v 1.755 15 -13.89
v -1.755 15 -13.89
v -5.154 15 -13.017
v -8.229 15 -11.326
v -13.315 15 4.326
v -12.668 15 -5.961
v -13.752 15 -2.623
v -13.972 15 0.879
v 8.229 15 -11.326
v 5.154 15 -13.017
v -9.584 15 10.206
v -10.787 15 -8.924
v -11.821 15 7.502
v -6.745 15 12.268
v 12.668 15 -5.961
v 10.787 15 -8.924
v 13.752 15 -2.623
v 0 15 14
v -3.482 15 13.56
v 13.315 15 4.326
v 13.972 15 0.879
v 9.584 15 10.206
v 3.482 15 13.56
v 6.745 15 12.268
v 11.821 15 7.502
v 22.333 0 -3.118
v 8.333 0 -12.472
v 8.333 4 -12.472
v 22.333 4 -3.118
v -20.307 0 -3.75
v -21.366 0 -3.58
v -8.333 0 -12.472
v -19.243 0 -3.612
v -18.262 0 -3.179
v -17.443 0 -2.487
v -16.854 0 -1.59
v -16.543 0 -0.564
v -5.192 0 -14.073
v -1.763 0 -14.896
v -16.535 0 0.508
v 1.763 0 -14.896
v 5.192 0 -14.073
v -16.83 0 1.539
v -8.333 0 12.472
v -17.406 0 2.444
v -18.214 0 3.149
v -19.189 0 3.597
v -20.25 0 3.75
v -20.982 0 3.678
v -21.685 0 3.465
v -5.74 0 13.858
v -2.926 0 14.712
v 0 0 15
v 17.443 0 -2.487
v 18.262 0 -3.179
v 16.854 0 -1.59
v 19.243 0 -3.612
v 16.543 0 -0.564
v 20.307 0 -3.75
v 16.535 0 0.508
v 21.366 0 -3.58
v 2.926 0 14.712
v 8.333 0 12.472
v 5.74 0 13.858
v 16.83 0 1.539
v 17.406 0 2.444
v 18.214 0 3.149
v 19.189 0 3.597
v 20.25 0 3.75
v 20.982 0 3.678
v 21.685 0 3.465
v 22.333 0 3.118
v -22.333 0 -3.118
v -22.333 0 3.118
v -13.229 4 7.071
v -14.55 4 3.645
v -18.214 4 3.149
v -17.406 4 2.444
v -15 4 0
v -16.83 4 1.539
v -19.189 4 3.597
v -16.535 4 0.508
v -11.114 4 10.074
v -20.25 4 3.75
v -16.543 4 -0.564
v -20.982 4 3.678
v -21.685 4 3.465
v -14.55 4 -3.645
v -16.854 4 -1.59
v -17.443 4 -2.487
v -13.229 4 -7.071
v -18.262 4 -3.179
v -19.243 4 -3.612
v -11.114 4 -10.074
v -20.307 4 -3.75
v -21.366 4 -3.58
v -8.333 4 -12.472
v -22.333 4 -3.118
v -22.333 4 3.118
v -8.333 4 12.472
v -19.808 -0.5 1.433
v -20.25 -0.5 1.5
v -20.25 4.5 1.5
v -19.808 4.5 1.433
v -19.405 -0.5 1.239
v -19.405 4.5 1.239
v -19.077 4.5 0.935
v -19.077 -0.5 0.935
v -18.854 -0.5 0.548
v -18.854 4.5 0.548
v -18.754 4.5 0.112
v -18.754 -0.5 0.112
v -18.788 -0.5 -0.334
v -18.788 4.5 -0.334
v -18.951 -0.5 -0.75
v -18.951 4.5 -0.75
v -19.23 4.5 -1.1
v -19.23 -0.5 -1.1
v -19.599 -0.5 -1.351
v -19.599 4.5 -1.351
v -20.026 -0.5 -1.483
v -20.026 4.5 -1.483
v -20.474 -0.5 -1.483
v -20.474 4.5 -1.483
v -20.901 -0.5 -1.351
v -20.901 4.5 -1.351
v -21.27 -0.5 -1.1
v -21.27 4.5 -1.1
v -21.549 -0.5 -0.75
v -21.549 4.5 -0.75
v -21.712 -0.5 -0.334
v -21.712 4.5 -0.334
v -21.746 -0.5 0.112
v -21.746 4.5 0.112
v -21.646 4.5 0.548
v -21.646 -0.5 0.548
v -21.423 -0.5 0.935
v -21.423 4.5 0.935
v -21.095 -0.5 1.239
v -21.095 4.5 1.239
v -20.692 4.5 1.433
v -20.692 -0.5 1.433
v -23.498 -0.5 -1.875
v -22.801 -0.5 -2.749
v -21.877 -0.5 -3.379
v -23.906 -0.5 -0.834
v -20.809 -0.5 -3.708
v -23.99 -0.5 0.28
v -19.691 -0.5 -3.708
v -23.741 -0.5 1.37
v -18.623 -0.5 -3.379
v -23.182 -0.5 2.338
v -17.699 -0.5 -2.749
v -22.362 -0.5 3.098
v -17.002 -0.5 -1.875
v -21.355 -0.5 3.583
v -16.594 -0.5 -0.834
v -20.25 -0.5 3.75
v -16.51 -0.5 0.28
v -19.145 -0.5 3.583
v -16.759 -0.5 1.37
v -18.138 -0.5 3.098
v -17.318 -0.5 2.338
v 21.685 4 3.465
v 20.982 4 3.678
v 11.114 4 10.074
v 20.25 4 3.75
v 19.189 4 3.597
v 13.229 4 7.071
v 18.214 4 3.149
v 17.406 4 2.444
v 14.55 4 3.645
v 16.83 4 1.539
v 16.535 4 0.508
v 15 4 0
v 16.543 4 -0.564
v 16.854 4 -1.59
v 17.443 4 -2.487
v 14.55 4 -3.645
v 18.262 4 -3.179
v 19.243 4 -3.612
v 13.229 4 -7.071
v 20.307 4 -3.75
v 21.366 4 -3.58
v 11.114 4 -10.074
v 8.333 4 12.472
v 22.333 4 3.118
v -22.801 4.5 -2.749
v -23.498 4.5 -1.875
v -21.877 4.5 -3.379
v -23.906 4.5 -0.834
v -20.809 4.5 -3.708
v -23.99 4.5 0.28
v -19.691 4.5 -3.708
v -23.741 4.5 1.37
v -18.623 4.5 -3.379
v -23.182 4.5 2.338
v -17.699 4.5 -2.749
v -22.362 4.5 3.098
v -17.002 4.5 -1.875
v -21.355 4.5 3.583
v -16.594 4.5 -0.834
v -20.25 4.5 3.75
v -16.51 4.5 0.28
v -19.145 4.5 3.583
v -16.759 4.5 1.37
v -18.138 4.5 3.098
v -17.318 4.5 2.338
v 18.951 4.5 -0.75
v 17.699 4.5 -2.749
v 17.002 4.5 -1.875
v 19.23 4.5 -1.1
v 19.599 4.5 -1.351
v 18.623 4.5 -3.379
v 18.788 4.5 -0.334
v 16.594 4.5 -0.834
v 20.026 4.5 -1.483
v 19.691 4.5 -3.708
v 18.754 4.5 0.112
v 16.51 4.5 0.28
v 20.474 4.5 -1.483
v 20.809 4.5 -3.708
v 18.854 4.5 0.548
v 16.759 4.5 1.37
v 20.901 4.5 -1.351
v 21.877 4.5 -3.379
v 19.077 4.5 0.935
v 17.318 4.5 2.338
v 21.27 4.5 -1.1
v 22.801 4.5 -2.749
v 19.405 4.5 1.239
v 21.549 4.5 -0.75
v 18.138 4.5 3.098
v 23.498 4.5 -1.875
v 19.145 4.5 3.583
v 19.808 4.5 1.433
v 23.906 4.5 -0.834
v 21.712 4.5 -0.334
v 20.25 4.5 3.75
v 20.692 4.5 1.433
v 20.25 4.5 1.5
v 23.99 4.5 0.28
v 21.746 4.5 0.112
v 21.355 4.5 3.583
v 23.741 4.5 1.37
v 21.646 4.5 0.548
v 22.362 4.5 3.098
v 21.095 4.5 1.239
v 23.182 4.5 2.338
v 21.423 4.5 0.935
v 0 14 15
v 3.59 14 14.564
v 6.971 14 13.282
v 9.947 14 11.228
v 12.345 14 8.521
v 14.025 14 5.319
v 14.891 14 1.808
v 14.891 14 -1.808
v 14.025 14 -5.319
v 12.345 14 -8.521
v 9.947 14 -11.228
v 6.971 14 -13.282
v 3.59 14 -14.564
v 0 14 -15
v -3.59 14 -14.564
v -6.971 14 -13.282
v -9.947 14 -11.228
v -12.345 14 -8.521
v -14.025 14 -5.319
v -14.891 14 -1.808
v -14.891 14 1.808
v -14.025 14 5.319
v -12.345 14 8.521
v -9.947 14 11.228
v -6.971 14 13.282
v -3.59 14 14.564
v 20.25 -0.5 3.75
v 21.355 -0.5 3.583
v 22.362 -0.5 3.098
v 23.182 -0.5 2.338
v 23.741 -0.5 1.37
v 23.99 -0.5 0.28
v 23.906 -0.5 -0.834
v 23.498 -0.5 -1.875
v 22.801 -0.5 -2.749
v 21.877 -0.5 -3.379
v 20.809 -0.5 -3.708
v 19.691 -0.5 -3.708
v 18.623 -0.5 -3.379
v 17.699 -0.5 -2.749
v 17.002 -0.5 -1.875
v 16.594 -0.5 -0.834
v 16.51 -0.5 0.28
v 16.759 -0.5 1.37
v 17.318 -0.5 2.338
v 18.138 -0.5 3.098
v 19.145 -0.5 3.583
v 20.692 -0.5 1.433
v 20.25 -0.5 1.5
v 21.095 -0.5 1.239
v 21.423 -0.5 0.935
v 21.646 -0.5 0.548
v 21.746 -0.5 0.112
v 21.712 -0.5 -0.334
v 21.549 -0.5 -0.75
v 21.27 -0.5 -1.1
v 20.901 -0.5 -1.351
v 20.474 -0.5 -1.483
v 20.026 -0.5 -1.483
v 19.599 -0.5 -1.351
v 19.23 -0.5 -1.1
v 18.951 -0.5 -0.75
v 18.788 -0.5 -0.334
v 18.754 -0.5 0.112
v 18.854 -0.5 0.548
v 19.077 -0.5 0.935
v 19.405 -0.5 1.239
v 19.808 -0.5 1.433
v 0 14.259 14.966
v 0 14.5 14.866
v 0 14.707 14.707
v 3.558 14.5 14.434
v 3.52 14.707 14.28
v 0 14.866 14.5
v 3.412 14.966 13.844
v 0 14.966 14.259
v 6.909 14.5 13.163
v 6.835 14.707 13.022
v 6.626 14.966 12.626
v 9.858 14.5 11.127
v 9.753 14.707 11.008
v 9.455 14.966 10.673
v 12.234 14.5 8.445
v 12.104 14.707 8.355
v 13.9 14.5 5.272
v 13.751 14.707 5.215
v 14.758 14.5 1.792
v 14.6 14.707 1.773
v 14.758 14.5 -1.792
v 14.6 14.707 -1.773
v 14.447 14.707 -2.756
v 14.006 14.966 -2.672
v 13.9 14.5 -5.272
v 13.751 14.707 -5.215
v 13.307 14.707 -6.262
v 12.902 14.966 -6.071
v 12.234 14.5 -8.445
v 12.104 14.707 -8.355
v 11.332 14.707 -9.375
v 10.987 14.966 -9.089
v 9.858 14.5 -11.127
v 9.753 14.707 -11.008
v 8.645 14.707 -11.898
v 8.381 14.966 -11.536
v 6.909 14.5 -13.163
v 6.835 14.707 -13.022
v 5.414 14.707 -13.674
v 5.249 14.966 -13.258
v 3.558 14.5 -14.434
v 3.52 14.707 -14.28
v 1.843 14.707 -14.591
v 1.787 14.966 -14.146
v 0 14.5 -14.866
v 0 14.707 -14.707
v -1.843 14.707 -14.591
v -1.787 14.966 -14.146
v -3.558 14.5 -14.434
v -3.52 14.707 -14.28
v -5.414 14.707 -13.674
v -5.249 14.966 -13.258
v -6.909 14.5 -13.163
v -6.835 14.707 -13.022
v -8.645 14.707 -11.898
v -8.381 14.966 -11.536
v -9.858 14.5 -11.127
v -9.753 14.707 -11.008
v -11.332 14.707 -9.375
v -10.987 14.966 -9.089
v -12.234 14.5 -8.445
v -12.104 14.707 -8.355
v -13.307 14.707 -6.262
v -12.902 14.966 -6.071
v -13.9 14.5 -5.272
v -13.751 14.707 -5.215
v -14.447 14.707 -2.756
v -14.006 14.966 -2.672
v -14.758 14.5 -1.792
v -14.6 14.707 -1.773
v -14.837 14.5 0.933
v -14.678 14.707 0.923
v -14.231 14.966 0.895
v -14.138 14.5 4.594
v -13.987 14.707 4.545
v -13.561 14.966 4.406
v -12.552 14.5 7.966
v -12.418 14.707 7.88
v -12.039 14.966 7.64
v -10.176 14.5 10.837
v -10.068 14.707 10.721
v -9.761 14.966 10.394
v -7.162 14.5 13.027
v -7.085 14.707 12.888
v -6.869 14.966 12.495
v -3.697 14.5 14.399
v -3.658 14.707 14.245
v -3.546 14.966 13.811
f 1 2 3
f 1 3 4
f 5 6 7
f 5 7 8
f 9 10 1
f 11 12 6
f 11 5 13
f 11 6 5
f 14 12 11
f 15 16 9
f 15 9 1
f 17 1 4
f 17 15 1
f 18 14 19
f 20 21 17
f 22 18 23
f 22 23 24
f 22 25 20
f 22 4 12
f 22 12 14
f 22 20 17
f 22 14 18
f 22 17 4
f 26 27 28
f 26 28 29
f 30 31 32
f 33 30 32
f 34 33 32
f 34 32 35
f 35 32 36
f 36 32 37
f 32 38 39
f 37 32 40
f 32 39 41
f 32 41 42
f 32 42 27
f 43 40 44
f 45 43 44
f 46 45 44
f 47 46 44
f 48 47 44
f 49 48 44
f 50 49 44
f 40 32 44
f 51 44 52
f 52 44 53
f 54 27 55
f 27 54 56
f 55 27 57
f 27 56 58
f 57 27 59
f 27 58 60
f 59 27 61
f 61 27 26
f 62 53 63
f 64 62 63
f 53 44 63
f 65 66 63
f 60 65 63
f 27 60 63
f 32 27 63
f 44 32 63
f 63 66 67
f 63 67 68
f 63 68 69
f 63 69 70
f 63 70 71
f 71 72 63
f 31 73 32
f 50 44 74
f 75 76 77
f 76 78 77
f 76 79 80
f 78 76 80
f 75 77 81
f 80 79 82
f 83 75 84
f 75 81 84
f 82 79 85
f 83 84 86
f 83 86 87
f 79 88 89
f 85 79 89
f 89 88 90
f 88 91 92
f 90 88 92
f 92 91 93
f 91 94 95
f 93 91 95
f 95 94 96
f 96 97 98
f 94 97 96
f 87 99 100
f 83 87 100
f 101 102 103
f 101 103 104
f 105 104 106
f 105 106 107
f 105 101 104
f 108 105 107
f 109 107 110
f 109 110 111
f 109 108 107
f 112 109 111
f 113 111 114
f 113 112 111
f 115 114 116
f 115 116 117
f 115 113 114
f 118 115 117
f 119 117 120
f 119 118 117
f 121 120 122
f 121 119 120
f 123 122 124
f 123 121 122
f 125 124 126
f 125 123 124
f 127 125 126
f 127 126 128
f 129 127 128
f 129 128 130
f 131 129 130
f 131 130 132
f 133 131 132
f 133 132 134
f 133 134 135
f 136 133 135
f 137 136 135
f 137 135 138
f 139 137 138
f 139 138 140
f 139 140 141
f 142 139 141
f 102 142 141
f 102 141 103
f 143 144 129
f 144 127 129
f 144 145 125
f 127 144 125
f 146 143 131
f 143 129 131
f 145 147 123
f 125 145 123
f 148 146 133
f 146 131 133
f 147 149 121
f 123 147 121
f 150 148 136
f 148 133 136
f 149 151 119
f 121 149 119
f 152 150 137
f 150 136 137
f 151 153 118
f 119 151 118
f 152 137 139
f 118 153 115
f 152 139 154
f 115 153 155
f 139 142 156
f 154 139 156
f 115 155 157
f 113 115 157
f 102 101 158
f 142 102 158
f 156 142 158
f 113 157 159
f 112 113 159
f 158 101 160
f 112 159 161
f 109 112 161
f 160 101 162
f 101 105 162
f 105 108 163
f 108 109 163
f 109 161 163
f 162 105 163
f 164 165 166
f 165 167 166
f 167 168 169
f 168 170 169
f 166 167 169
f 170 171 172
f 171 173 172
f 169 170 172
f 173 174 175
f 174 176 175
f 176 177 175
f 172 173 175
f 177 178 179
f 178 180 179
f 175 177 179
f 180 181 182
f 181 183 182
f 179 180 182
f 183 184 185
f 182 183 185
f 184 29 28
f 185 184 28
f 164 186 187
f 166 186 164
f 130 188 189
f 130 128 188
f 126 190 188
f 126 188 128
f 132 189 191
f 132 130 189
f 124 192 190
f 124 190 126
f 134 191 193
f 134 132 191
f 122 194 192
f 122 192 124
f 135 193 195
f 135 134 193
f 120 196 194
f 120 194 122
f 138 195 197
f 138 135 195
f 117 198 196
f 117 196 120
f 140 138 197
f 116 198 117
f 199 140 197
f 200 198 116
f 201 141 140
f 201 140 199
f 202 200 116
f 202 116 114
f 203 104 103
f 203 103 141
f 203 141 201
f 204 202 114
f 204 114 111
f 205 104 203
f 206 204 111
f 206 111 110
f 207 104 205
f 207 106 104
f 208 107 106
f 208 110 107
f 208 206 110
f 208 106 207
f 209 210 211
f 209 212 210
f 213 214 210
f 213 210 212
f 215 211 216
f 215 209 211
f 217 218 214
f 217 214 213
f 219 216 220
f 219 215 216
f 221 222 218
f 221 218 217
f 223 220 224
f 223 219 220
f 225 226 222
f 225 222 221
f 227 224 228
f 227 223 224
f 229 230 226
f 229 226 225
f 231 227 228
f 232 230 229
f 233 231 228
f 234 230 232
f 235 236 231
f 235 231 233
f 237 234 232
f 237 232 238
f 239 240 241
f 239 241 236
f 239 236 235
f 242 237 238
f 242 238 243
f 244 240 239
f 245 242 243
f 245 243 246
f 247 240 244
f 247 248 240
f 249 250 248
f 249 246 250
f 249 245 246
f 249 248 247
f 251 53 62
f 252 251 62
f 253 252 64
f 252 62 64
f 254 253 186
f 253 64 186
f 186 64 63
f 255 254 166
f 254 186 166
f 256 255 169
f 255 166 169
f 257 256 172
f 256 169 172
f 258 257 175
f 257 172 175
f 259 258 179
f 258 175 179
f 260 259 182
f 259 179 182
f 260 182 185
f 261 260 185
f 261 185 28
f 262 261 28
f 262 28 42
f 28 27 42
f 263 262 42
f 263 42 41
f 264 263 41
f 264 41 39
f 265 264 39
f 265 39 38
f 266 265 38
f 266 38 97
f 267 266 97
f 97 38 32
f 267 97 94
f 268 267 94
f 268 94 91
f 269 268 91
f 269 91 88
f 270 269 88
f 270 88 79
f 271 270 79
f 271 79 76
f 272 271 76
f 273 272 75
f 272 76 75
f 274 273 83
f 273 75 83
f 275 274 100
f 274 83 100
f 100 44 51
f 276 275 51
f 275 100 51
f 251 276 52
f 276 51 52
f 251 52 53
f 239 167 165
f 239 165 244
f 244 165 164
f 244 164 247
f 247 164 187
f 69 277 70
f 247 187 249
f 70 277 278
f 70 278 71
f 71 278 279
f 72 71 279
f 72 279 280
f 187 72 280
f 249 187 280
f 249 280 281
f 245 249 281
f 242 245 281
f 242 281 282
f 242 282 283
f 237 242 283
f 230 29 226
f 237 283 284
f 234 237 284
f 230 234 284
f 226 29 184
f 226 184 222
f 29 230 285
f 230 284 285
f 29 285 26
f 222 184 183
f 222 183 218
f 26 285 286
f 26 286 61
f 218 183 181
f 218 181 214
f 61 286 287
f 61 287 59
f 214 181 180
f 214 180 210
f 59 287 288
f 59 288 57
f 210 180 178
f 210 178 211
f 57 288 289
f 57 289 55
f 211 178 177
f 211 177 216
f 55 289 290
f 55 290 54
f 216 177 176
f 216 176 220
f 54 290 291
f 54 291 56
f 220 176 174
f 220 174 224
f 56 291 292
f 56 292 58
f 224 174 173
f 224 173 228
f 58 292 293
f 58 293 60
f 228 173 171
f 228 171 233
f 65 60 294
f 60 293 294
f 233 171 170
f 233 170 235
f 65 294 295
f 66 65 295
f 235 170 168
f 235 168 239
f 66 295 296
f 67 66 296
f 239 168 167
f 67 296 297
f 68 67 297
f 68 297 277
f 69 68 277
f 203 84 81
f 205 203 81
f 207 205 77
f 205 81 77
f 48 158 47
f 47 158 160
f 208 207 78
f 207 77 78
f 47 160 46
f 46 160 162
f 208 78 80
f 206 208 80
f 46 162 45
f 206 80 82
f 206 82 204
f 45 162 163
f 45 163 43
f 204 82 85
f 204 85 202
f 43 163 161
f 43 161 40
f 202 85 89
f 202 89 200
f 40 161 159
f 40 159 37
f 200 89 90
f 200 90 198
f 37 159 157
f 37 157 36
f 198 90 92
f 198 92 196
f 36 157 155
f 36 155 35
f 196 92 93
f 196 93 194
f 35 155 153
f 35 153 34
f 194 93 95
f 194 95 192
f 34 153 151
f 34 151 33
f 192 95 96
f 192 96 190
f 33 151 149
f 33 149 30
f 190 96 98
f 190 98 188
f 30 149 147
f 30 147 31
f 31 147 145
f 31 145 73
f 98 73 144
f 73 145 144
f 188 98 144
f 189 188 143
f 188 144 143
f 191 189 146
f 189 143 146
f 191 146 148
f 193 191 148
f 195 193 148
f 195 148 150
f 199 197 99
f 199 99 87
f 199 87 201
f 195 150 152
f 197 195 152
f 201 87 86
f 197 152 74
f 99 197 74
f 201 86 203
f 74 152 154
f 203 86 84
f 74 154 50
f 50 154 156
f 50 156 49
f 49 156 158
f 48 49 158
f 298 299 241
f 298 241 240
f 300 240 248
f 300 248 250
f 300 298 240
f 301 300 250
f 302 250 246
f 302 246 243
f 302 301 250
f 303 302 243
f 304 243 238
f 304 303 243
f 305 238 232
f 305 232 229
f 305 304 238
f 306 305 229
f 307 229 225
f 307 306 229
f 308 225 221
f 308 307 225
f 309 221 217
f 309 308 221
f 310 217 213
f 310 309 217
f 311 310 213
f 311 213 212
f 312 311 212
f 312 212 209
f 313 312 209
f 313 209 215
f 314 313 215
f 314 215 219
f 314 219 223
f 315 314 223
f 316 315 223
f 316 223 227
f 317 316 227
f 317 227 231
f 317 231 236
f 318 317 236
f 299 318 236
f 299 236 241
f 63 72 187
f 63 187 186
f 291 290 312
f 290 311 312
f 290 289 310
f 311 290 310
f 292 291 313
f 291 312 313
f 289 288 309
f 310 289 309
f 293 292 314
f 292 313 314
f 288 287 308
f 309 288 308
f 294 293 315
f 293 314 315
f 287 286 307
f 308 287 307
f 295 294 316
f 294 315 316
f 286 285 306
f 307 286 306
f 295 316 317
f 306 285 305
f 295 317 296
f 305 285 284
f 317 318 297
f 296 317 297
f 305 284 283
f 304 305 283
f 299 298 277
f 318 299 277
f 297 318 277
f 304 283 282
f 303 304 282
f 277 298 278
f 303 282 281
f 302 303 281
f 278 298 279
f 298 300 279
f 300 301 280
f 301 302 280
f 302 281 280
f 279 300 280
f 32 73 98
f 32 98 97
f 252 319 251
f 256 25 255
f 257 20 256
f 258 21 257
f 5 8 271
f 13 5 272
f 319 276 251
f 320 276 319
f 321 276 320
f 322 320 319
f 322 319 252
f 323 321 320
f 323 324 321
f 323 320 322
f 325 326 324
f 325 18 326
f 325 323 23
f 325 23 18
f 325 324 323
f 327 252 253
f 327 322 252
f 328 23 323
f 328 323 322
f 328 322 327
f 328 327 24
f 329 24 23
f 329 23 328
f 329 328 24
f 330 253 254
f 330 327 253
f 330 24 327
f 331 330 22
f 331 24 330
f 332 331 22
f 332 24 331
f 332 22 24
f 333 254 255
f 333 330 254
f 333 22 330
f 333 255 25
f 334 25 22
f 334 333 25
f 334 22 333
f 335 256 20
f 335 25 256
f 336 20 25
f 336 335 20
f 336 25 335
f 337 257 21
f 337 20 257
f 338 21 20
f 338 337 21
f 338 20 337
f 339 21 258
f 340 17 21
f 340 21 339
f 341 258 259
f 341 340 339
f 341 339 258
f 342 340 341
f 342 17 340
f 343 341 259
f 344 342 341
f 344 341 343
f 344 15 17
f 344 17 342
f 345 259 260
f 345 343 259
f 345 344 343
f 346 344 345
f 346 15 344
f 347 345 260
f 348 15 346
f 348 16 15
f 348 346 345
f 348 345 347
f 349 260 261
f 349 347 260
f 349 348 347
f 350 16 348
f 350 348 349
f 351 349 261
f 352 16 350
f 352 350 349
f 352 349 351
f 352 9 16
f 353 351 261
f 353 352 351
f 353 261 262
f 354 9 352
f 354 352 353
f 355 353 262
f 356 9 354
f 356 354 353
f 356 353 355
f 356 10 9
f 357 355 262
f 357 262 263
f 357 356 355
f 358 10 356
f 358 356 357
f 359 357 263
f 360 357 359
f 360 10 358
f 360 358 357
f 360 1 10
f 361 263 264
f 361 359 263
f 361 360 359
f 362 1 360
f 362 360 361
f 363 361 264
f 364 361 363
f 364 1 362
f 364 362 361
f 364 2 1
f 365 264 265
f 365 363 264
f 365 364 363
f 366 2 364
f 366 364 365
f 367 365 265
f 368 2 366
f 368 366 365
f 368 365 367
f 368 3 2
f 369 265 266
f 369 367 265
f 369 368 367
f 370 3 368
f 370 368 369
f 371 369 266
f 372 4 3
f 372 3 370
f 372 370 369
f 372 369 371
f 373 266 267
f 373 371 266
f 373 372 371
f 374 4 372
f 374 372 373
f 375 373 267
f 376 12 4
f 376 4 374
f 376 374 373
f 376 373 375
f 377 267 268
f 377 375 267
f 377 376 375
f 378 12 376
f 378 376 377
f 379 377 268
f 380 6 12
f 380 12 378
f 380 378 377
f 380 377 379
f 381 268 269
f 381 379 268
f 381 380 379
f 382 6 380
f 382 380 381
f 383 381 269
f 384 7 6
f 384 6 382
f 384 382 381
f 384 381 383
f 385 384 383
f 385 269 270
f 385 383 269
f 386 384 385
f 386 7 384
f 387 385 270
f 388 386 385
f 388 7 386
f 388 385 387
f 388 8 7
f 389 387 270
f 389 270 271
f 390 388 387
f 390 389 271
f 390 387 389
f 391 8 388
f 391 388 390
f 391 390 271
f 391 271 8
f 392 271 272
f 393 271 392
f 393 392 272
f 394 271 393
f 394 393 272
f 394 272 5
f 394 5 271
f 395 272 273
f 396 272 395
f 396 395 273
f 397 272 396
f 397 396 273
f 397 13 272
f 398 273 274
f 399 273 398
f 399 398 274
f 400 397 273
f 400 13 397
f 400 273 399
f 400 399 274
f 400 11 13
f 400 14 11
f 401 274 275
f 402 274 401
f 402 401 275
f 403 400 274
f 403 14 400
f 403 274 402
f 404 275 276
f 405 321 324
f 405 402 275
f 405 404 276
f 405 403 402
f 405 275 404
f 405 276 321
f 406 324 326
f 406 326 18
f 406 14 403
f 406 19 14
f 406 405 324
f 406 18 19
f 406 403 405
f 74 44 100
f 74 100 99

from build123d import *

# Parameters (mm, degrees)
SKETCH1_R                = 15
BOSS_EXTRUDE1_DEPTH      = 15
SKETCH2_R                = 1.5
BOSS_EXTRUDE2_DEPTH      = 4
BOSS_EXTRUDE3_DEPTH      = 0.5
BOSS_EXTRUDE3_DEPTH_BACK = 4.5
SKETCH3_R                = 3.75
SKETCH3_R_2              = 1.5
FILLET1_R                = 1


with BuildPart() as part:
    # Sketch1 → Boss-Extrude1 (new body)
    with BuildSketch(Plane(origin=(0, 0, 0), x_dir=(1, 0, 0), z_dir=(0, 1, 0))):
        with Locations(Location((0, 0, 0), (0, 0, 270))):
            Circle(SKETCH1_R)
    extrude(amount=BOSS_EXTRUDE1_DEPTH)

    # Sketch2 → Boss-Extrude2 (add)
    # profile 1 of 2: a face of its own
    with BuildSketch(Plane(origin=(0, 0, 0), x_dir=(1, 0, 0), z_dir=(0, 1, 0))):
        with BuildLine():
            ThreePointArc((-8.333333333, 12.472191289), (-15, 0), (-8.333333333, -12.472191289))
            Line((-8.333333333, -12.472191289), (-22.333333333, -3.118047822))
            ThreePointArc((-22.333333333, -3.118047822), (-24, 0), (-22.333333333, 3.118047822))
            Line((-22.333333333, 3.118047822), (-8.333333333, 12.472191289))
        make_face()
        with Locations(Location((-20.25, 0, 0), (0, 0, 270))):
            Circle(SKETCH2_R, mode=Mode.SUBTRACT)
    # profile 2 of 2: a face of its own
    with BuildSketch(Plane(origin=(0, 0, 0), x_dir=(1, 0, 0), z_dir=(0, 1, 0))):
        with BuildLine():
            Line((8.333333333, 12.472191289), (22.333333333, 3.118047822))
            ThreePointArc((22.333333333, 3.118047822), (24, 0), (22.333333333, -3.118047822))
            Line((22.333333333, -3.118047822), (8.333333333, -12.472191289))
            ThreePointArc((8.333333333, -12.472191289), (15, 0), (8.333333333, 12.472191289))
        make_face()
        with Locations(Location((20.25, 0, 0), (0, 0, 270))):
            Circle(SKETCH2_R, mode=Mode.SUBTRACT)
    extrude(amount=BOSS_EXTRUDE2_DEPTH)

    # Sketch3 → Boss-Extrude3 (add, two sides: drawn at the far end of the back side and taken through both)
    # profile 1 of 2: a face of its own
    with BuildSketch(Plane(origin=(0, 4, 0), x_dir=(1, 0, 0), z_dir=(0, 1, 0)).offset(-BOSS_EXTRUDE3_DEPTH_BACK)):
        with Locations(Location((-20.25, 0, 0), (0, 0, 270))):
            Circle(SKETCH3_R)
        with Locations(Location((-20.25, 0, 0), (0, 0, 270))):
            Circle(SKETCH3_R_2, mode=Mode.SUBTRACT)
    # profile 2 of 2: a face of its own
    with BuildSketch(Plane(origin=(0, 4, 0), x_dir=(1, 0, 0), z_dir=(0, 1, 0)).offset(-BOSS_EXTRUDE3_DEPTH_BACK)):
        with Locations(Location((20.25, 0, 0), (0, 0, 270))):
            Circle(SKETCH3_R)
        with Locations(Location((20.25, 0, 0), (0, 0, 270))):
            Circle(SKETCH3_R_2, mode=Mode.SUBTRACT)
    extrude(amount=BOSS_EXTRUDE3_DEPTH + BOSS_EXTRUDE3_DEPTH_BACK)

    # Fillet1
    fillet1_edges = [part.edges().sort_by_distance(p)[0] for p in [
        (0, 15, -15),
    ]]
    fillet(fillet1_edges, radius=FILLET1_R)


solid = part.part
